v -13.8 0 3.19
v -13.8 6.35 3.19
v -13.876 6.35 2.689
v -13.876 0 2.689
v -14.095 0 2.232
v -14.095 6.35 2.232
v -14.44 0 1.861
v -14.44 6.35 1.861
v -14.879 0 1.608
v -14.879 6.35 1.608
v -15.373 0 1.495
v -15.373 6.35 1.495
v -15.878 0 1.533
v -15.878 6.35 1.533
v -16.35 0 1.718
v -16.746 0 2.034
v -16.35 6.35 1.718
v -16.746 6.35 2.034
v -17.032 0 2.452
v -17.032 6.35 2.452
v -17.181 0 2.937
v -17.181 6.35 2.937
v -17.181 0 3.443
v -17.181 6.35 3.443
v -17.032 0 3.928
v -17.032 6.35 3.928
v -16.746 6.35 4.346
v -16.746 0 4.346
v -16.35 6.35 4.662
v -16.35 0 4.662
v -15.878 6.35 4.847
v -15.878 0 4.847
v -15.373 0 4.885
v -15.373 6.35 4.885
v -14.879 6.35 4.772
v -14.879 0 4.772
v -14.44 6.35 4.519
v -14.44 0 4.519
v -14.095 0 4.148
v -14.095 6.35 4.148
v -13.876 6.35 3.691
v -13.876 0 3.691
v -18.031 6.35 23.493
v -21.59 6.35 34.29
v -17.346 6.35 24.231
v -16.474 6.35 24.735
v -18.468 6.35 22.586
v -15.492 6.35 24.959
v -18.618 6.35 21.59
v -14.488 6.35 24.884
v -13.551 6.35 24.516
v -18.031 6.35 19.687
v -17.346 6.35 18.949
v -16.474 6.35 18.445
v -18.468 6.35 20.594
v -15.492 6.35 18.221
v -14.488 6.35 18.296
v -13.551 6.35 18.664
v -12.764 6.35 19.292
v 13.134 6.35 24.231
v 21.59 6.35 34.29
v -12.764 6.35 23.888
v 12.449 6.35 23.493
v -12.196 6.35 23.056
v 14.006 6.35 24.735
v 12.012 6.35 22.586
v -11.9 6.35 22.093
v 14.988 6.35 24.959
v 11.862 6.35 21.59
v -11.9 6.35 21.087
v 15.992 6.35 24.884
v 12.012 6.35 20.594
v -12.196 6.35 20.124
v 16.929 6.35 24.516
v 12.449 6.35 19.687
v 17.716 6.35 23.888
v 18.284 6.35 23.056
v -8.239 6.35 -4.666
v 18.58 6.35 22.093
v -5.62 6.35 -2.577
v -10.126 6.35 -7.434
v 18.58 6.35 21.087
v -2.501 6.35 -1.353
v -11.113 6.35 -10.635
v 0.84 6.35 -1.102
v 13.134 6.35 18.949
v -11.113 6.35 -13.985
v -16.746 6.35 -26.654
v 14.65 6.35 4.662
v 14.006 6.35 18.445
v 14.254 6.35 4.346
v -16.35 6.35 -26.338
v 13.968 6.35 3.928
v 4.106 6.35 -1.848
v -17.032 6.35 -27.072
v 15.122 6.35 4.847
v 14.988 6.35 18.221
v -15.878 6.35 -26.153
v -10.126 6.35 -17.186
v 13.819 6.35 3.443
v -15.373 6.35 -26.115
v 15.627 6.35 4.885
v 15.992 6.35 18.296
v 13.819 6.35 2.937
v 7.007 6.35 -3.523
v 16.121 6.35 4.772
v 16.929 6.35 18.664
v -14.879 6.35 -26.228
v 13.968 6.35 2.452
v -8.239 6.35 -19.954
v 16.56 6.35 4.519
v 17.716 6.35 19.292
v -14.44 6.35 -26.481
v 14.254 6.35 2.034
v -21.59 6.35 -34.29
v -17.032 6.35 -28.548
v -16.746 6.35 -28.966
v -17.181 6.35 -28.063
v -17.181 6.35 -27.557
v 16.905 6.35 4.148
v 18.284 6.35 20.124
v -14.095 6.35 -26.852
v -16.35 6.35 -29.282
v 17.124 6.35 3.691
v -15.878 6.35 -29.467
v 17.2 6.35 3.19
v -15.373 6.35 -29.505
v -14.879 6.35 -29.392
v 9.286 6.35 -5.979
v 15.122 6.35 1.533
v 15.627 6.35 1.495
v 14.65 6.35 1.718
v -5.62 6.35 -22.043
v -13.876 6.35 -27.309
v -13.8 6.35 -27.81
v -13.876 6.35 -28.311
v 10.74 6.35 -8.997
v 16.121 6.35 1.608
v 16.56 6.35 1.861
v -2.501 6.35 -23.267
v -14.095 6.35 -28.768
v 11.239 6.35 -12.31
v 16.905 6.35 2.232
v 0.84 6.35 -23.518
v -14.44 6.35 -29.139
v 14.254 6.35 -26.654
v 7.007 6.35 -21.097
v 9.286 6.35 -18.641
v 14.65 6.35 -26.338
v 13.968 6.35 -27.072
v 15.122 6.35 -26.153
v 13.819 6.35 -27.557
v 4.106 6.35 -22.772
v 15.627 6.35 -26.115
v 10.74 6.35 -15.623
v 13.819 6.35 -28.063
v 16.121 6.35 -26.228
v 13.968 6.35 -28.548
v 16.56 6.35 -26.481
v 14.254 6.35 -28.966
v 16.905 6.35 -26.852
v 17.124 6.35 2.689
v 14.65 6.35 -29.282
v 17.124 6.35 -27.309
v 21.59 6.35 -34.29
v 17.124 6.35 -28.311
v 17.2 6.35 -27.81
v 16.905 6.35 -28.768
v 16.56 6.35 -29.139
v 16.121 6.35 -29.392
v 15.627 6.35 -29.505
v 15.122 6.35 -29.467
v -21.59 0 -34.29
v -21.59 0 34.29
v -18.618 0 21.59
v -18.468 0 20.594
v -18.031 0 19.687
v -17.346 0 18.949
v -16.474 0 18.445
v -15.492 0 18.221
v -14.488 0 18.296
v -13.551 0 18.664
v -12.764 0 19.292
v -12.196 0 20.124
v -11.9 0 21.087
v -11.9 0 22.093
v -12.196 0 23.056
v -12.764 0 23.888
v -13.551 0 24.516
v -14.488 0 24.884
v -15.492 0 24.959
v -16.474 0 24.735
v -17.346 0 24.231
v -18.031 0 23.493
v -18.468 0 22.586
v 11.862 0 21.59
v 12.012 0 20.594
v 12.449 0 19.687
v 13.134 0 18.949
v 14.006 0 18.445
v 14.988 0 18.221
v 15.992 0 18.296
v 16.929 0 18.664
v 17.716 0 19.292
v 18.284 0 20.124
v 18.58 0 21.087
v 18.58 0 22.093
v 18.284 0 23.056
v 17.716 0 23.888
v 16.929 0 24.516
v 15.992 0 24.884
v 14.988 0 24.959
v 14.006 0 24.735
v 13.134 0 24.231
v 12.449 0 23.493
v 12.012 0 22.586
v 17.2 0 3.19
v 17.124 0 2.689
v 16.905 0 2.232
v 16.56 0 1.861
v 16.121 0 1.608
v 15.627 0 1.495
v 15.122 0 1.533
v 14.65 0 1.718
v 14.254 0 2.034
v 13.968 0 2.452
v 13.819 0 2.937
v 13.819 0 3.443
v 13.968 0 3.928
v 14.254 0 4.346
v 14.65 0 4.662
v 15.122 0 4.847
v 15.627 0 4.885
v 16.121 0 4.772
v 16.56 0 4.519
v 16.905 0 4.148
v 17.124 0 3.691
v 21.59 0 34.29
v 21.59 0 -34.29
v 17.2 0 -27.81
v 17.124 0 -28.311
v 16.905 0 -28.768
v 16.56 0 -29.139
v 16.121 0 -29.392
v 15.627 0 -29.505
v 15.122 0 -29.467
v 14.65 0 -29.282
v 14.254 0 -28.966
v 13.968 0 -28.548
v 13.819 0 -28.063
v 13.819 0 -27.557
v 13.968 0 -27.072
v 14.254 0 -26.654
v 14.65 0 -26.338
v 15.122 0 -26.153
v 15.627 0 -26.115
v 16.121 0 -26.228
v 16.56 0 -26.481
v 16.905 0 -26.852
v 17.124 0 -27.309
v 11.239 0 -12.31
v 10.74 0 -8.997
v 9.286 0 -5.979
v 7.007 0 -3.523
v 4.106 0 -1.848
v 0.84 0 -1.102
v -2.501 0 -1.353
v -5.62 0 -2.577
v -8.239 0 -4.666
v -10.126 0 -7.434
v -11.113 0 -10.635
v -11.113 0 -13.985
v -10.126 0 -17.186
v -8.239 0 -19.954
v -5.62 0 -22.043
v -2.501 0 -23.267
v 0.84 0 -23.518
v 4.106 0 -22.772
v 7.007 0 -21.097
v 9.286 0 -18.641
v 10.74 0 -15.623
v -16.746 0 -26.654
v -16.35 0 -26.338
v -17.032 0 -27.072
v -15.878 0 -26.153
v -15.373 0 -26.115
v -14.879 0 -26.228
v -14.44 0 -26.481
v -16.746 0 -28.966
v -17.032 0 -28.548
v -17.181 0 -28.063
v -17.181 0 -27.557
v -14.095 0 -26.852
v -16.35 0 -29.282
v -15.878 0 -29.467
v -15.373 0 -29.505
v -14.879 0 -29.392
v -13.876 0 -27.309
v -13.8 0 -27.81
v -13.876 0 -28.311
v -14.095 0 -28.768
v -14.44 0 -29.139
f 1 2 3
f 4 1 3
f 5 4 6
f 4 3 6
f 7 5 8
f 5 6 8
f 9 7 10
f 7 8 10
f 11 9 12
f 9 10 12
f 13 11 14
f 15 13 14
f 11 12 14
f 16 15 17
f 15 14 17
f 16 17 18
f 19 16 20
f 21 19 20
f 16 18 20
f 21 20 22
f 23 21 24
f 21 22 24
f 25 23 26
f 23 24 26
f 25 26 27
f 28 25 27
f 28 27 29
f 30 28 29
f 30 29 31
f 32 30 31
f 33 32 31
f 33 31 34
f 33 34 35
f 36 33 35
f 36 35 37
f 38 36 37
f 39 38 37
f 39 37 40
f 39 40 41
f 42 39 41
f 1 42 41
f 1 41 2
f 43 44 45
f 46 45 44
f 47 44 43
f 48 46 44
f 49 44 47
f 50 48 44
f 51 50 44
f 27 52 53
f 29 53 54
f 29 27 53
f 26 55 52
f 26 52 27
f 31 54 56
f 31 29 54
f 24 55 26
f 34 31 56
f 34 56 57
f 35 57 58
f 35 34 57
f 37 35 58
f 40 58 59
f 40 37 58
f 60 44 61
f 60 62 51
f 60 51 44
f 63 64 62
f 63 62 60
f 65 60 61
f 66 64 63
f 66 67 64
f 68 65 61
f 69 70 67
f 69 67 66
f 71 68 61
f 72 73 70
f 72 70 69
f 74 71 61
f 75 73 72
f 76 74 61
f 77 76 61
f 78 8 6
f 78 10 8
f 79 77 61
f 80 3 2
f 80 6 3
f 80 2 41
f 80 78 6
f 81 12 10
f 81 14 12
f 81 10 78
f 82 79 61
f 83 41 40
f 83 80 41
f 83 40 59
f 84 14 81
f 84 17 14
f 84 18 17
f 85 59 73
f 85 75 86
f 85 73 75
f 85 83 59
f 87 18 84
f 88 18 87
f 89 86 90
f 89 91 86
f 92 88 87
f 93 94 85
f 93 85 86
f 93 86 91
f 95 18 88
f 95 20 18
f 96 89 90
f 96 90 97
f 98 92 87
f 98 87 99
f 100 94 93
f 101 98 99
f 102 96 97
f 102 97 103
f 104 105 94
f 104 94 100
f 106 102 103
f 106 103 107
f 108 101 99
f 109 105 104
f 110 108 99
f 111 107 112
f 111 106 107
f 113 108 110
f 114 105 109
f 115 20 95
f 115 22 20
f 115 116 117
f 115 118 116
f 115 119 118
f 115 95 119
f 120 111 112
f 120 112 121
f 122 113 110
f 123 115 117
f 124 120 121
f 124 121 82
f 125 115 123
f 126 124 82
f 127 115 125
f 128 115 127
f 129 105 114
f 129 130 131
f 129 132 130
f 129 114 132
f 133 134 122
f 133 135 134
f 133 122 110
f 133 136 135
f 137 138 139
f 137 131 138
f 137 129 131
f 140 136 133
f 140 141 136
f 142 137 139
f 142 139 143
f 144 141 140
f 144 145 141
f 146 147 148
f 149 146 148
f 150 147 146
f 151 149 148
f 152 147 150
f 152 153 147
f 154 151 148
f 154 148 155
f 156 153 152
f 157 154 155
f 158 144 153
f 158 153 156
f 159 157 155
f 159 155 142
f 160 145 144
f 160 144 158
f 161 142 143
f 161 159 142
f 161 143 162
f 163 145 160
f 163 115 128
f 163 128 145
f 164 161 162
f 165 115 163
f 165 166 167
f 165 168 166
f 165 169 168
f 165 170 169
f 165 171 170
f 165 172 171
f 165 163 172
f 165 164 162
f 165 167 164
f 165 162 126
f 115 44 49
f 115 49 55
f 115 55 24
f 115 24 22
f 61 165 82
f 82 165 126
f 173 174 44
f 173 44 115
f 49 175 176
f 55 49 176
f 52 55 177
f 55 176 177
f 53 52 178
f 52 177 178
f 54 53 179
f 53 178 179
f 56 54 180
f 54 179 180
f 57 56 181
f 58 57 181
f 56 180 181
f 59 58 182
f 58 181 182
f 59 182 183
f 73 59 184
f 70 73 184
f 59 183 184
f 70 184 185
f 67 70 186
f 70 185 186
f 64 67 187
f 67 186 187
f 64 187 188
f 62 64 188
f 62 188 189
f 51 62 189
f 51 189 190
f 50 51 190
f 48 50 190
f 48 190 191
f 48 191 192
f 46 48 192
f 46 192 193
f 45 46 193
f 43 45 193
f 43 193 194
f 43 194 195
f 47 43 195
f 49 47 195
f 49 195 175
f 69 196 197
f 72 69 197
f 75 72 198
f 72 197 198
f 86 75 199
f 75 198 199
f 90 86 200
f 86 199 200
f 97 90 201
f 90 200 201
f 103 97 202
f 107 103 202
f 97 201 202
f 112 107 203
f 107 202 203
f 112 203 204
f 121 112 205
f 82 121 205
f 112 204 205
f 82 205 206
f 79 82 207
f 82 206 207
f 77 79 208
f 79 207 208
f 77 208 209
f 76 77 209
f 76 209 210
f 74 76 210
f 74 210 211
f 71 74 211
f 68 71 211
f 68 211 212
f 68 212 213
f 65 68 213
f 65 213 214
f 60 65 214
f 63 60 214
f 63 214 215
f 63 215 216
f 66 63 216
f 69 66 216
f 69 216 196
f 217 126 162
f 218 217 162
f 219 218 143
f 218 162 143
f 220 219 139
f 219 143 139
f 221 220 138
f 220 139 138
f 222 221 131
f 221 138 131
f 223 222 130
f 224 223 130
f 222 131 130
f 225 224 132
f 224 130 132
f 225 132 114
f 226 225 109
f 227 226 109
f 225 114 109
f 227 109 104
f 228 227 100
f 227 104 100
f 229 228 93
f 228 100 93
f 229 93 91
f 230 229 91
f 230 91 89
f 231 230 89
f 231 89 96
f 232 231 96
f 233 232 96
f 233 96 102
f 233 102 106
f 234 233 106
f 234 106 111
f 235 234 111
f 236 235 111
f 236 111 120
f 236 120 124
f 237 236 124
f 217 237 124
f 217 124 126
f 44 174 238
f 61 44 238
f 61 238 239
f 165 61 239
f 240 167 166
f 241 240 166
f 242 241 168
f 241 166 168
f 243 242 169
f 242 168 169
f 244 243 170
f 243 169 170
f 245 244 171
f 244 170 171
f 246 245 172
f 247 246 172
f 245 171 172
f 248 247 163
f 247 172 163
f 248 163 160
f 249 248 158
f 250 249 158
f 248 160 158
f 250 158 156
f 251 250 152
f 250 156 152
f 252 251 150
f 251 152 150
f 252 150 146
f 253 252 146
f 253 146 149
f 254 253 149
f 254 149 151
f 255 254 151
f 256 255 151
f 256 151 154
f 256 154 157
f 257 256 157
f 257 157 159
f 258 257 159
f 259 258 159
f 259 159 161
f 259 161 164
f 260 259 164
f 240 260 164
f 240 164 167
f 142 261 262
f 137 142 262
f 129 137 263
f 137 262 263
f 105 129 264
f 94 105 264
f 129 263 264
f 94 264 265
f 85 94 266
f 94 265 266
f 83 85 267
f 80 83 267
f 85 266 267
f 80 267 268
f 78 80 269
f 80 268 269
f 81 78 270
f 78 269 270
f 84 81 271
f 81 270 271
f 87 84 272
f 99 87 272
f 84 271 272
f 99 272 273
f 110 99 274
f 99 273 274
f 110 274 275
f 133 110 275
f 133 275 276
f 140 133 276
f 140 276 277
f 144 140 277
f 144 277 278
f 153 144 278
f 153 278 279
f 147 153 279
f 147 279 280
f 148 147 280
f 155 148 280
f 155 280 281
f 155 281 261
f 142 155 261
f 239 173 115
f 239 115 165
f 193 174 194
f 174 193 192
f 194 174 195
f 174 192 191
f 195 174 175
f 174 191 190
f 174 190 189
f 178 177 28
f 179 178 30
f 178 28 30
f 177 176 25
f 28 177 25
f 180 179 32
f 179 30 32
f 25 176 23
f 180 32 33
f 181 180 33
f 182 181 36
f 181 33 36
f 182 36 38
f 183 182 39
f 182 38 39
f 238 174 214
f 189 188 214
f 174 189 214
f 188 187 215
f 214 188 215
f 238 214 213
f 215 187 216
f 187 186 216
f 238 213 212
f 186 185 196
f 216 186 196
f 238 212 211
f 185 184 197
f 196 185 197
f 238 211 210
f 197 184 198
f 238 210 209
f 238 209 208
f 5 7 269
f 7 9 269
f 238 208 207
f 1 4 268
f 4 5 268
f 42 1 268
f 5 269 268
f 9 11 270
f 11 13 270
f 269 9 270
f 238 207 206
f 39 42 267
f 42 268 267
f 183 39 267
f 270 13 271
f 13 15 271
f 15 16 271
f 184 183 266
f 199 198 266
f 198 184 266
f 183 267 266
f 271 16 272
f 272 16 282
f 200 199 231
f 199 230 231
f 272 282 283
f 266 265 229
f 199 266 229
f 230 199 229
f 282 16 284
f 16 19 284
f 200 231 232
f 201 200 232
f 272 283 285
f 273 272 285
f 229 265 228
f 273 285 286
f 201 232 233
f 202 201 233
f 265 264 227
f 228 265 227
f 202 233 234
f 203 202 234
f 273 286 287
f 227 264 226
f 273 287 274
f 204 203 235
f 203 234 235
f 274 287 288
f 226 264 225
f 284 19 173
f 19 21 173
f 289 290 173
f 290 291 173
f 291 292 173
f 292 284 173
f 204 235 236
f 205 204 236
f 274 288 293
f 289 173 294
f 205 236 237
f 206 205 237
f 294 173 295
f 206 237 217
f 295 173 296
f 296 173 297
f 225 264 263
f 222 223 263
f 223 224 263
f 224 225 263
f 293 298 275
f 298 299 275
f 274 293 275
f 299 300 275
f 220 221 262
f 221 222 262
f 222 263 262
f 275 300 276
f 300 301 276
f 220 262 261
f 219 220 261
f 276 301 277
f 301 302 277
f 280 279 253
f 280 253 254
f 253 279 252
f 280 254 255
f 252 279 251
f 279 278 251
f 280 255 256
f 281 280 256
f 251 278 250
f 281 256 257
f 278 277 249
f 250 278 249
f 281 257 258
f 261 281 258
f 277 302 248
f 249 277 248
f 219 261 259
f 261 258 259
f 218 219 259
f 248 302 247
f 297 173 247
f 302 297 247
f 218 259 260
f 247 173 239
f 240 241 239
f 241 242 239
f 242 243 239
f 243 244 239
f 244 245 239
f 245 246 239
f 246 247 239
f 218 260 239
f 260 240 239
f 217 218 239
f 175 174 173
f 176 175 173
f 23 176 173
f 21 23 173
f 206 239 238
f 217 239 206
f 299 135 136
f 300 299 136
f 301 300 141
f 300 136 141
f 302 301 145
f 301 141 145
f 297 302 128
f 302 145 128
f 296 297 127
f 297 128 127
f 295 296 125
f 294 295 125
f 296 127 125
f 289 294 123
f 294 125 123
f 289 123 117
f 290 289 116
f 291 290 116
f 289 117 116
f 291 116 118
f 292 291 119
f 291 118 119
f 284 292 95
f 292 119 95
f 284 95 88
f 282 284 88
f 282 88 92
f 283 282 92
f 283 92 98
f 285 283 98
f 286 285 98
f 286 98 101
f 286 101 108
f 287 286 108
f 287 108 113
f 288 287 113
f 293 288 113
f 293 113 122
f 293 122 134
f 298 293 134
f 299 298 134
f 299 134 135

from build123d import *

# Parameters (mm, degrees)
SKETCH1_W               = 43.18
SKETCH1_H               = 68.58
BOSS_EXTRUDE1_DEPTH     = 6.35
F_1_4_CLEARANCE_HOLE1_D = 6.7564
SKETCH7_R               = 11.239
CUT_EXTRUDE1_DEPTH      = 7.35
M3_CLEARANCE_HOLE1_D    = 3.4


with BuildPart() as part:
    # Sketch1 → Boss-Extrude1 (new body)
    with BuildSketch(Plane(origin=(0, 0, 0), x_dir=(1, 0, 0), z_dir=(0, 1, 0))):
        Rectangle(SKETCH1_W, SKETCH1_H)
    extrude(amount=BOSS_EXTRUDE1_DEPTH)

    # 1/4 Clearance Hole1 (through all)
    with Locations(Plane(origin=(0, 6.35, 0), x_dir=(1, 0, 0), z_dir=(0, 1, 0))):
        with Locations((15.24, -21.59), (-15.24, -21.59)):
            Hole(F_1_4_CLEARANCE_HOLE1_D / 2)

    # Sketch7 → Cut-Extrude1 (cut, through all)
    with BuildSketch(Plane.XZ):
        with Locations((0, -12.31)):
            Circle(SKETCH7_R)
    extrude(amount=-CUT_EXTRUDE1_DEPTH, mode=Mode.SUBTRACT)

    # M3 Clearance Hole1 (through all)
    with Locations(Plane(origin=(0, 0, 0), x_dir=(-1, 0, 0), z_dir=(0, -1, 0))):
        with Locations((-15.5, 27.81), (15.5, 27.81), (15.5, -3.19), (-15.5, -3.19)):
            Hole(M3_CLEARANCE_HOLE1_D / 2)


solid = part.part
